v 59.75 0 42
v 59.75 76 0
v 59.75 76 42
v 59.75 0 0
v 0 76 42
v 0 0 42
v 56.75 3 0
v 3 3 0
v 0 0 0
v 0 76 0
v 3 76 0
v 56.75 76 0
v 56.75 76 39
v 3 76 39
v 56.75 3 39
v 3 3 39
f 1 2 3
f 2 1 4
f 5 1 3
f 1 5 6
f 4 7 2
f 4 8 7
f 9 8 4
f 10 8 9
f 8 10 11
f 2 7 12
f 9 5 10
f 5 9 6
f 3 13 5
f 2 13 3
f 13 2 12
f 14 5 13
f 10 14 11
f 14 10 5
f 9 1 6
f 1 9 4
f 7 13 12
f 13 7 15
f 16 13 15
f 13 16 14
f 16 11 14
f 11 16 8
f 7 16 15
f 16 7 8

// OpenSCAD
// By GityUpNow(2019). Licensed under the MIT License
// All units are in millimeters

//Constants
//Accuracy
$fn = 60;
TOLERANCE = 3;

//GC30E
GC30E_LENGTH = 107.5;
GC30E_WIDTH = 67;
GC30E_HEIGHT = 36;
GC30E_PLUG_DIAM = 14 + TOLERANCE;

//Mount
THICKNESS = 3;
LENGTH_PERCENTAGE = 0.50;
MOUNT_LENGTH = GC30E_LENGTH * LENGTH_PERCENTAGE + THICKNESS + TOLERANCE;
MOUNT_WIDTH = GC30E_WIDTH + 2 * THICKNESS + TOLERANCE;
MOUNT_HEIGHT = GC30E_HEIGHT + THICKNESS + TOLERANCE;


module base() {
    difference() {
        cube([MOUNT_LENGTH,
              MOUNT_WIDTH,
              MOUNT_HEIGHT]);
        translate([THICKNESS, THICKNESS, 0]) {
            cube([MOUNT_LENGTH - 2 * THICKNESS,
                  MOUNT_WIDTH - THICKNESS,
                  MOUNT_HEIGHT - THICKNESS]);
        } 
    }
}

base();
